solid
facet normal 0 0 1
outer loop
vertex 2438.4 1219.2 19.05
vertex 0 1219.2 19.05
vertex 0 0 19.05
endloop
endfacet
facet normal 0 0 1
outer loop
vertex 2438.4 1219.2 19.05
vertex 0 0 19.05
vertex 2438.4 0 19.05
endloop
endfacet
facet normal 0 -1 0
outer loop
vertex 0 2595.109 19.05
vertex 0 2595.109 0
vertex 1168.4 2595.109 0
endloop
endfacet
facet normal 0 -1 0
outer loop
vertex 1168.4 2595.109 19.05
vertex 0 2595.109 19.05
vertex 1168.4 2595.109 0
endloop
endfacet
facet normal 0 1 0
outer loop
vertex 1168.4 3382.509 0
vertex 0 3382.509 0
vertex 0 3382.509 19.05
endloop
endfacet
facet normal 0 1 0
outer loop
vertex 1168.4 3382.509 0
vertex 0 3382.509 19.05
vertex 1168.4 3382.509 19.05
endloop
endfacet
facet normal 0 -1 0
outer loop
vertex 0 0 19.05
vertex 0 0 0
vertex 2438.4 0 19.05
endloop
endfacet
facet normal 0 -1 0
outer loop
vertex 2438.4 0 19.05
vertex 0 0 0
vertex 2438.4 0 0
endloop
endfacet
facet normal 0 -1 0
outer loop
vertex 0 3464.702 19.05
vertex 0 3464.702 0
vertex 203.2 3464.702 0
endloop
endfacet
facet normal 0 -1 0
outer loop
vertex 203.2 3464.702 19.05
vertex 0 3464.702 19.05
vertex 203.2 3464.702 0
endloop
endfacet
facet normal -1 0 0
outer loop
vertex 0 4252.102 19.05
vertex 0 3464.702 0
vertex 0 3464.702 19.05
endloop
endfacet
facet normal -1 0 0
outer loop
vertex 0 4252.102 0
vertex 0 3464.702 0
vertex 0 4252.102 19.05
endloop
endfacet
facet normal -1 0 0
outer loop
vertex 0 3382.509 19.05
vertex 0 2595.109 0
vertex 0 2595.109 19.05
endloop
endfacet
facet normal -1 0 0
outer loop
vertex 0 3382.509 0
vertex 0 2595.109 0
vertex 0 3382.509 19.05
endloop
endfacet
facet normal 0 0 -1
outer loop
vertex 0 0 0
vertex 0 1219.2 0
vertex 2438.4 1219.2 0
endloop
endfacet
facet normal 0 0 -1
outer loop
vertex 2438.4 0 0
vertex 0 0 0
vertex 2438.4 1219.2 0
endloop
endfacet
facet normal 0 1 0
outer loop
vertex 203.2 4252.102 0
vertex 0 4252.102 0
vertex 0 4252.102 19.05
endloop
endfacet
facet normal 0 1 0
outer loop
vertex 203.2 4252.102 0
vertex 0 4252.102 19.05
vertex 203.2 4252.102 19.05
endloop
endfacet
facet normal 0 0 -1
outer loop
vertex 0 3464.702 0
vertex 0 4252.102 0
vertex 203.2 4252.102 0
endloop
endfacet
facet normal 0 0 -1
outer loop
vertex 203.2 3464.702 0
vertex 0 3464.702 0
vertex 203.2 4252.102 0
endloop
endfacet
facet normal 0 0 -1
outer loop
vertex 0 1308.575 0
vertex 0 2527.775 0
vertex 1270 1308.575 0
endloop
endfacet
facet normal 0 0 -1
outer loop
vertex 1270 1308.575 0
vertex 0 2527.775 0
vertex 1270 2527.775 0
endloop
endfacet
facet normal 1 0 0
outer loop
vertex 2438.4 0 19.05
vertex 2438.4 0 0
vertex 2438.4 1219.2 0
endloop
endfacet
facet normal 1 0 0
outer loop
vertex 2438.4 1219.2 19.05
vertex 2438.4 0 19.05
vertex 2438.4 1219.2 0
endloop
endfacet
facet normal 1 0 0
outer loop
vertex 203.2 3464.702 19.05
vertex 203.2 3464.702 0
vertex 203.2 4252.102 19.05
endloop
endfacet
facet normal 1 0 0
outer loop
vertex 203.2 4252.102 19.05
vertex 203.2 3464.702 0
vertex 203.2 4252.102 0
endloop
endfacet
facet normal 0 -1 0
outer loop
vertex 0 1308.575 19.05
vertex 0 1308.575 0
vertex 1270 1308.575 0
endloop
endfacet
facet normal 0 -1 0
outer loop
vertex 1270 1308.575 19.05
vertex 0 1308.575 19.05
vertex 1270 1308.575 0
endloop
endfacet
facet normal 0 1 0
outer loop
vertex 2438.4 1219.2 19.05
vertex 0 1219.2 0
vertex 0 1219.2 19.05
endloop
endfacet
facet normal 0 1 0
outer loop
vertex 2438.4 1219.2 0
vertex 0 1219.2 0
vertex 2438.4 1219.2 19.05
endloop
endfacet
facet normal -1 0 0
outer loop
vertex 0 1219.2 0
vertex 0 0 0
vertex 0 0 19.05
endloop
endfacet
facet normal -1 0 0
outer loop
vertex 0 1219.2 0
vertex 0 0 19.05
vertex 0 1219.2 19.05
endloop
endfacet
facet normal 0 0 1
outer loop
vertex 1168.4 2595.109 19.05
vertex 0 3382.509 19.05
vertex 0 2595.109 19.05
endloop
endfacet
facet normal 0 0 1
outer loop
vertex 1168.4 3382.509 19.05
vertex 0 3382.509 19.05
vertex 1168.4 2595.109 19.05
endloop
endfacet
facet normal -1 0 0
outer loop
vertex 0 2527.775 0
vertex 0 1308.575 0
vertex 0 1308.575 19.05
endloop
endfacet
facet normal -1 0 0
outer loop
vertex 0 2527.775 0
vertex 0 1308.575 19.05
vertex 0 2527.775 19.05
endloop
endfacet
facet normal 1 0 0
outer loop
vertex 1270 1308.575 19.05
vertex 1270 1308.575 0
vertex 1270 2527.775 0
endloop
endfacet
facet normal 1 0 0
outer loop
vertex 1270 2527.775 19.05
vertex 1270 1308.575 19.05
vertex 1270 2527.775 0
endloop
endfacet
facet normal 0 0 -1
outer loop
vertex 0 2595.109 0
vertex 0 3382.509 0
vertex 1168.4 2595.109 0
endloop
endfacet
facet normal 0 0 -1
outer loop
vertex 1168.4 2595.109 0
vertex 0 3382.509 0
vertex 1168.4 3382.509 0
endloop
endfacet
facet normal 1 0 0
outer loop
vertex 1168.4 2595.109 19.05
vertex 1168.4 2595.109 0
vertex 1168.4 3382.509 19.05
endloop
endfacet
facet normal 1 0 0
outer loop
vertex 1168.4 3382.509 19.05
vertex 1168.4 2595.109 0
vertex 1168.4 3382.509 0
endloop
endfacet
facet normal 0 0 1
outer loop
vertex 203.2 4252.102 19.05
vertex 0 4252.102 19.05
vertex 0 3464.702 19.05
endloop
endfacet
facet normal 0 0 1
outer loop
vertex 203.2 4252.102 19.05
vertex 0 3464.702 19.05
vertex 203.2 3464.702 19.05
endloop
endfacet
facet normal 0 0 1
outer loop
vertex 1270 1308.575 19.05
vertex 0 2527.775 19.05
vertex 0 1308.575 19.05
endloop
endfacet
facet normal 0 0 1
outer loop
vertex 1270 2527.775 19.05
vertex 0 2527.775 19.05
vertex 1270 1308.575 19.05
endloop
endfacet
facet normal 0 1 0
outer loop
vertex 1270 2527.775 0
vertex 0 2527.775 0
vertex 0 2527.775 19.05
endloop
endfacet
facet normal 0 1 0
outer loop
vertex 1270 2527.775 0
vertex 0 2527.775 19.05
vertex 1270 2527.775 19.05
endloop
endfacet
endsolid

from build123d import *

# Parameters (mm, degrees)
F0_W     = 2438.4
F0_H     = 1219.2
F1_DEPTH = 19.05
F0_W_2   = 1270
F0_W_3   = 1168.4
F0_H_2   = 787.4
F0_W_4   = 203.2


# Not quite as in the source:
# - a length typed as a fraction of an inch, garbled in the dataset ("3 / 203.2 mm" for 3/8 in), is restored


with BuildPart() as f1:
    # F0 (on Top) → F1 (new body)
    with BuildSketch(Plane.XY):
        with Locations((1219.2, 609.6)):
            Rectangle(F0_W, F0_H)
    extrude(amount=F1_DEPTH)


with BuildPart() as f1b:
    # F0 (on Top) → F1, piece 2 (new body)
    with BuildSketch(Plane.XY):
        with Locations((635, 1918.174795723)):
            Rectangle(F0_W_2, F0_H)
    extrude(amount=F1_DEPTH)


with BuildPart() as f1c:
    # F0 (on Top) → F1, piece 3 (new body)
    with BuildSketch(Plane.XY):
        with Locations((584.2, 2988.8089931488)):
            Rectangle(F0_W_3, F0_H_2)
    extrude(amount=F1_DEPTH)


with BuildPart() as f1d:
    # F0 (on Top) → F1, piece 4 (new body)
    with BuildSketch(Plane.XY):
        with Locations((101.6, 3858.4023677826)):
            Rectangle(F0_W_4, F0_H_2)
    extrude(amount=F1_DEPTH)


solid = Compound([f1.part, f1b.part, f1c.part, f1d.part])
